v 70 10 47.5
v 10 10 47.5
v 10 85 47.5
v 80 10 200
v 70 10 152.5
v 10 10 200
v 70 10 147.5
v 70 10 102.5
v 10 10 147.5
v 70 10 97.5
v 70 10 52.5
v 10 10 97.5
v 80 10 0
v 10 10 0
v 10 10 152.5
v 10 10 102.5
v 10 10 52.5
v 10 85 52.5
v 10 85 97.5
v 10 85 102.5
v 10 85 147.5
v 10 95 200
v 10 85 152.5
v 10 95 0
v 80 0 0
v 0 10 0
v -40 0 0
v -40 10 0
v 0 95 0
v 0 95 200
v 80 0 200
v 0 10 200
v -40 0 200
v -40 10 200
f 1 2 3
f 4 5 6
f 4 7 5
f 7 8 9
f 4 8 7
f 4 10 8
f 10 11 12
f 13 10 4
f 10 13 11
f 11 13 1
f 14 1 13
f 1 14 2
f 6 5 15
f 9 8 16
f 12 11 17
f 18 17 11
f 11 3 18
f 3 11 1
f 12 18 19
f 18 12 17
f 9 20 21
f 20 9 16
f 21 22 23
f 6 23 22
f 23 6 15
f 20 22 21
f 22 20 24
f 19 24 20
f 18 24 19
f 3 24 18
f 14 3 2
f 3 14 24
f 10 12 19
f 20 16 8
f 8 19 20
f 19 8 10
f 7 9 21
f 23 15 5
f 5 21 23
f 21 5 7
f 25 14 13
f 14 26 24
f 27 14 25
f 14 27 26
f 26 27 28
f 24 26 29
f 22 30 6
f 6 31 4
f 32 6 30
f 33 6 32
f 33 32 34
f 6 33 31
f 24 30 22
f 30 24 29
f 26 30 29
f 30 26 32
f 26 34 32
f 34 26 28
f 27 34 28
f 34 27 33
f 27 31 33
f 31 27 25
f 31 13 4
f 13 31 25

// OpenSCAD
// Scooter Under Bed Stand - T BRACKET VERSION
// Modified L-bracket with base extending both left and right from vertical wall
// Default: 200mm length, 95mm right base, 40mm left base, 95mm height

// Parameters (in mm)
length = 200;               // Length of the bracket (extrusion direction)
base_width_right = 80;     // Width of base extending to the RIGHT of vertical wall
base_width_left = 40;      // Width of base extending to the LEFT of vertical wall
height = 95;               // Height of the vertical wall
wall_thickness = 10;       // Thickness of the walls

// ========== FILLET CONTROL ==========
add_fillets = false;       // Enable/disable all rounded corners and edges
fillet_radius = 3;         // Outer fillet radius (in mm)
inner_fillet_radius = 3;   // Inner corner fillet radius (in mm)
// =====================================

// ========== GUSSET REINFORCEMENT ==========
add_gussets = true;        // Enable corner gussets
gusset_size = 80;          // Size of triangular gusset (mm)
gusset_margin = 10;        // Gap between gusset edge and base/wall edge (mm)
num_gussets = 3;           // Number of gussets along the length
// ==========================================

// Resolution for smooth curves
$fn = 40;

// Basic T-shape profile (2D)
// The vertical wall sits on top of a base that extends both directions
module T_profile_2D() {
    difference() {
        // Outer T shape
        polygon(points = [
            // Start from bottom left of left base
            [-base_width_left, 0],
            // Go to bottom right of right base
            [base_width_right, 0],
            // Go up to wall thickness
            [base_width_right, wall_thickness],
            // Go left to the vertical wall right edge
            [wall_thickness, wall_thickness],
            // Go up the vertical wall
            [wall_thickness, height],
            // Go left to vertical wall left edge
            [0, height],
            // Go down to base level
            [0, wall_thickness],
            // Go left to left base edge
            [-base_width_left, wall_thickness],
            // Close the polygon back to start
        ]);
    }
}

// T-shape with rounded outer edges (2D)
module T_profile_rounded_2D() {
    offset(r = fillet_radius)
        offset(r = -fillet_radius)
            T_profile_2D();
}

// Simple T bracket extruded (no fillets)
module T_bracket_simple() {
    linear_extrude(height = length)
        T_profile_2D();
}

// T bracket with filleted inner corners
module T_bracket_filleted() {
    r = inner_fillet_radius;
    fr = fillet_radius;

    // Use minkowski to round all edges including the ends
    minkowski() {
        // Shrink the profile and length to compensate for minkowski expansion
        translate([fr, fr, fr])
            linear_extrude(height = length - 2*fr) {
                offset(r = -fr)
                    T_profile_2D();
            }

        // Sphere adds rounding to all edges and corners
        sphere(r = fr);
    }

    // Add inner corner fillets (rounded inside corners for strength)
    // Right corner (between vertical wall and right base)
    translate([wall_thickness, wall_thickness, fr])
        difference() {
            cube([r, r, length - 2*fr]);
            translate([r, r, -1])
                cylinder(h = length - 2*fr + 2, r = r);
        }

    // Left corner (between vertical wall and left base)
    translate([0, wall_thickness, fr])
        difference() {
            cube([r, r, length - 2*fr]);
            translate([0, r, -1])
                cylinder(h = length - 2*fr + 2, r = r);
        }
}

// Triangular gusset module (can be rectangular triangle)
module gusset(width, height, thickness) {
    // Triangle in the XY plane, extruded along Z
    linear_extrude(height = thickness)
        polygon(points = [
            [0, 0],
            [width, 0],
            [0, height]
        ]);
}

// T bracket with gusset reinforcements
module T_bracket_with_gussets() {
    gusset_thickness = 5;  // Thickness of each gusset
    usable_length = add_fillets ? length - 2*fillet_radius : length;  // Account for rounded ends if fillets enabled
    gusset_spacing = usable_length / (num_gussets + 1);
    gusset_offset = add_fillets ? fillet_radius : 0;  // Offset gussets if fillets are enabled

    // Calculate actual gusset dimensions based on available space with margin
    max_gusset_width = base_width_right - wall_thickness - gusset_margin;  // Available space on right base
    max_gusset_height = height - wall_thickness - gusset_margin;  // Available space on vertical wall
    actual_gusset_width = min(gusset_size, max_gusset_width);  // Limit by base width and gusset_size
    actual_gusset_height = min(gusset_size, max_gusset_height);  // Limit by wall height and gusset_size

    union() {
        // Base T bracket - choose filleted or simple based on add_fillets parameter
        if (add_fillets) {
            T_bracket_filleted();
        } else {
            T_bracket_simple();
        }

        // Add gussets along the right inner corner (right base side only)
        if (add_gussets) {
            for (i = [1:num_gussets]) {
                translate([wall_thickness, wall_thickness, gusset_offset + i * gusset_spacing - gusset_thickness/2])
                    gusset(actual_gusset_width, actual_gusset_height, gusset_thickness);
            }
        }
    }
}

// Render the T bracket
T_bracket_with_gussets();

// Preview info
echo(str("T Bracket dimensions:"));
echo(str("  Length: ", length, "mm (", length/10, "cm)"));
echo(str("  Base width RIGHT: ", base_width_right, "mm (", base_width_right/10, "cm)"));
echo(str("  Base width LEFT: ", base_width_left, "mm (", base_width_left/10, "cm)"));
echo(str("  Total base width: ", base_width_right + base_width_left, "mm (", (base_width_right + base_width_left)/10, "cm)"));
echo(str("  Height: ", height, "mm (", height/10, "cm)"));
echo(str("  Wall thickness: ", wall_thickness, "mm"));
echo(str("  Fillets: ", add_fillets ? "ENABLED" : "DISABLED"));
echo(str("  Gussets: ", add_gussets ? "ENABLED" : "DISABLED"));
